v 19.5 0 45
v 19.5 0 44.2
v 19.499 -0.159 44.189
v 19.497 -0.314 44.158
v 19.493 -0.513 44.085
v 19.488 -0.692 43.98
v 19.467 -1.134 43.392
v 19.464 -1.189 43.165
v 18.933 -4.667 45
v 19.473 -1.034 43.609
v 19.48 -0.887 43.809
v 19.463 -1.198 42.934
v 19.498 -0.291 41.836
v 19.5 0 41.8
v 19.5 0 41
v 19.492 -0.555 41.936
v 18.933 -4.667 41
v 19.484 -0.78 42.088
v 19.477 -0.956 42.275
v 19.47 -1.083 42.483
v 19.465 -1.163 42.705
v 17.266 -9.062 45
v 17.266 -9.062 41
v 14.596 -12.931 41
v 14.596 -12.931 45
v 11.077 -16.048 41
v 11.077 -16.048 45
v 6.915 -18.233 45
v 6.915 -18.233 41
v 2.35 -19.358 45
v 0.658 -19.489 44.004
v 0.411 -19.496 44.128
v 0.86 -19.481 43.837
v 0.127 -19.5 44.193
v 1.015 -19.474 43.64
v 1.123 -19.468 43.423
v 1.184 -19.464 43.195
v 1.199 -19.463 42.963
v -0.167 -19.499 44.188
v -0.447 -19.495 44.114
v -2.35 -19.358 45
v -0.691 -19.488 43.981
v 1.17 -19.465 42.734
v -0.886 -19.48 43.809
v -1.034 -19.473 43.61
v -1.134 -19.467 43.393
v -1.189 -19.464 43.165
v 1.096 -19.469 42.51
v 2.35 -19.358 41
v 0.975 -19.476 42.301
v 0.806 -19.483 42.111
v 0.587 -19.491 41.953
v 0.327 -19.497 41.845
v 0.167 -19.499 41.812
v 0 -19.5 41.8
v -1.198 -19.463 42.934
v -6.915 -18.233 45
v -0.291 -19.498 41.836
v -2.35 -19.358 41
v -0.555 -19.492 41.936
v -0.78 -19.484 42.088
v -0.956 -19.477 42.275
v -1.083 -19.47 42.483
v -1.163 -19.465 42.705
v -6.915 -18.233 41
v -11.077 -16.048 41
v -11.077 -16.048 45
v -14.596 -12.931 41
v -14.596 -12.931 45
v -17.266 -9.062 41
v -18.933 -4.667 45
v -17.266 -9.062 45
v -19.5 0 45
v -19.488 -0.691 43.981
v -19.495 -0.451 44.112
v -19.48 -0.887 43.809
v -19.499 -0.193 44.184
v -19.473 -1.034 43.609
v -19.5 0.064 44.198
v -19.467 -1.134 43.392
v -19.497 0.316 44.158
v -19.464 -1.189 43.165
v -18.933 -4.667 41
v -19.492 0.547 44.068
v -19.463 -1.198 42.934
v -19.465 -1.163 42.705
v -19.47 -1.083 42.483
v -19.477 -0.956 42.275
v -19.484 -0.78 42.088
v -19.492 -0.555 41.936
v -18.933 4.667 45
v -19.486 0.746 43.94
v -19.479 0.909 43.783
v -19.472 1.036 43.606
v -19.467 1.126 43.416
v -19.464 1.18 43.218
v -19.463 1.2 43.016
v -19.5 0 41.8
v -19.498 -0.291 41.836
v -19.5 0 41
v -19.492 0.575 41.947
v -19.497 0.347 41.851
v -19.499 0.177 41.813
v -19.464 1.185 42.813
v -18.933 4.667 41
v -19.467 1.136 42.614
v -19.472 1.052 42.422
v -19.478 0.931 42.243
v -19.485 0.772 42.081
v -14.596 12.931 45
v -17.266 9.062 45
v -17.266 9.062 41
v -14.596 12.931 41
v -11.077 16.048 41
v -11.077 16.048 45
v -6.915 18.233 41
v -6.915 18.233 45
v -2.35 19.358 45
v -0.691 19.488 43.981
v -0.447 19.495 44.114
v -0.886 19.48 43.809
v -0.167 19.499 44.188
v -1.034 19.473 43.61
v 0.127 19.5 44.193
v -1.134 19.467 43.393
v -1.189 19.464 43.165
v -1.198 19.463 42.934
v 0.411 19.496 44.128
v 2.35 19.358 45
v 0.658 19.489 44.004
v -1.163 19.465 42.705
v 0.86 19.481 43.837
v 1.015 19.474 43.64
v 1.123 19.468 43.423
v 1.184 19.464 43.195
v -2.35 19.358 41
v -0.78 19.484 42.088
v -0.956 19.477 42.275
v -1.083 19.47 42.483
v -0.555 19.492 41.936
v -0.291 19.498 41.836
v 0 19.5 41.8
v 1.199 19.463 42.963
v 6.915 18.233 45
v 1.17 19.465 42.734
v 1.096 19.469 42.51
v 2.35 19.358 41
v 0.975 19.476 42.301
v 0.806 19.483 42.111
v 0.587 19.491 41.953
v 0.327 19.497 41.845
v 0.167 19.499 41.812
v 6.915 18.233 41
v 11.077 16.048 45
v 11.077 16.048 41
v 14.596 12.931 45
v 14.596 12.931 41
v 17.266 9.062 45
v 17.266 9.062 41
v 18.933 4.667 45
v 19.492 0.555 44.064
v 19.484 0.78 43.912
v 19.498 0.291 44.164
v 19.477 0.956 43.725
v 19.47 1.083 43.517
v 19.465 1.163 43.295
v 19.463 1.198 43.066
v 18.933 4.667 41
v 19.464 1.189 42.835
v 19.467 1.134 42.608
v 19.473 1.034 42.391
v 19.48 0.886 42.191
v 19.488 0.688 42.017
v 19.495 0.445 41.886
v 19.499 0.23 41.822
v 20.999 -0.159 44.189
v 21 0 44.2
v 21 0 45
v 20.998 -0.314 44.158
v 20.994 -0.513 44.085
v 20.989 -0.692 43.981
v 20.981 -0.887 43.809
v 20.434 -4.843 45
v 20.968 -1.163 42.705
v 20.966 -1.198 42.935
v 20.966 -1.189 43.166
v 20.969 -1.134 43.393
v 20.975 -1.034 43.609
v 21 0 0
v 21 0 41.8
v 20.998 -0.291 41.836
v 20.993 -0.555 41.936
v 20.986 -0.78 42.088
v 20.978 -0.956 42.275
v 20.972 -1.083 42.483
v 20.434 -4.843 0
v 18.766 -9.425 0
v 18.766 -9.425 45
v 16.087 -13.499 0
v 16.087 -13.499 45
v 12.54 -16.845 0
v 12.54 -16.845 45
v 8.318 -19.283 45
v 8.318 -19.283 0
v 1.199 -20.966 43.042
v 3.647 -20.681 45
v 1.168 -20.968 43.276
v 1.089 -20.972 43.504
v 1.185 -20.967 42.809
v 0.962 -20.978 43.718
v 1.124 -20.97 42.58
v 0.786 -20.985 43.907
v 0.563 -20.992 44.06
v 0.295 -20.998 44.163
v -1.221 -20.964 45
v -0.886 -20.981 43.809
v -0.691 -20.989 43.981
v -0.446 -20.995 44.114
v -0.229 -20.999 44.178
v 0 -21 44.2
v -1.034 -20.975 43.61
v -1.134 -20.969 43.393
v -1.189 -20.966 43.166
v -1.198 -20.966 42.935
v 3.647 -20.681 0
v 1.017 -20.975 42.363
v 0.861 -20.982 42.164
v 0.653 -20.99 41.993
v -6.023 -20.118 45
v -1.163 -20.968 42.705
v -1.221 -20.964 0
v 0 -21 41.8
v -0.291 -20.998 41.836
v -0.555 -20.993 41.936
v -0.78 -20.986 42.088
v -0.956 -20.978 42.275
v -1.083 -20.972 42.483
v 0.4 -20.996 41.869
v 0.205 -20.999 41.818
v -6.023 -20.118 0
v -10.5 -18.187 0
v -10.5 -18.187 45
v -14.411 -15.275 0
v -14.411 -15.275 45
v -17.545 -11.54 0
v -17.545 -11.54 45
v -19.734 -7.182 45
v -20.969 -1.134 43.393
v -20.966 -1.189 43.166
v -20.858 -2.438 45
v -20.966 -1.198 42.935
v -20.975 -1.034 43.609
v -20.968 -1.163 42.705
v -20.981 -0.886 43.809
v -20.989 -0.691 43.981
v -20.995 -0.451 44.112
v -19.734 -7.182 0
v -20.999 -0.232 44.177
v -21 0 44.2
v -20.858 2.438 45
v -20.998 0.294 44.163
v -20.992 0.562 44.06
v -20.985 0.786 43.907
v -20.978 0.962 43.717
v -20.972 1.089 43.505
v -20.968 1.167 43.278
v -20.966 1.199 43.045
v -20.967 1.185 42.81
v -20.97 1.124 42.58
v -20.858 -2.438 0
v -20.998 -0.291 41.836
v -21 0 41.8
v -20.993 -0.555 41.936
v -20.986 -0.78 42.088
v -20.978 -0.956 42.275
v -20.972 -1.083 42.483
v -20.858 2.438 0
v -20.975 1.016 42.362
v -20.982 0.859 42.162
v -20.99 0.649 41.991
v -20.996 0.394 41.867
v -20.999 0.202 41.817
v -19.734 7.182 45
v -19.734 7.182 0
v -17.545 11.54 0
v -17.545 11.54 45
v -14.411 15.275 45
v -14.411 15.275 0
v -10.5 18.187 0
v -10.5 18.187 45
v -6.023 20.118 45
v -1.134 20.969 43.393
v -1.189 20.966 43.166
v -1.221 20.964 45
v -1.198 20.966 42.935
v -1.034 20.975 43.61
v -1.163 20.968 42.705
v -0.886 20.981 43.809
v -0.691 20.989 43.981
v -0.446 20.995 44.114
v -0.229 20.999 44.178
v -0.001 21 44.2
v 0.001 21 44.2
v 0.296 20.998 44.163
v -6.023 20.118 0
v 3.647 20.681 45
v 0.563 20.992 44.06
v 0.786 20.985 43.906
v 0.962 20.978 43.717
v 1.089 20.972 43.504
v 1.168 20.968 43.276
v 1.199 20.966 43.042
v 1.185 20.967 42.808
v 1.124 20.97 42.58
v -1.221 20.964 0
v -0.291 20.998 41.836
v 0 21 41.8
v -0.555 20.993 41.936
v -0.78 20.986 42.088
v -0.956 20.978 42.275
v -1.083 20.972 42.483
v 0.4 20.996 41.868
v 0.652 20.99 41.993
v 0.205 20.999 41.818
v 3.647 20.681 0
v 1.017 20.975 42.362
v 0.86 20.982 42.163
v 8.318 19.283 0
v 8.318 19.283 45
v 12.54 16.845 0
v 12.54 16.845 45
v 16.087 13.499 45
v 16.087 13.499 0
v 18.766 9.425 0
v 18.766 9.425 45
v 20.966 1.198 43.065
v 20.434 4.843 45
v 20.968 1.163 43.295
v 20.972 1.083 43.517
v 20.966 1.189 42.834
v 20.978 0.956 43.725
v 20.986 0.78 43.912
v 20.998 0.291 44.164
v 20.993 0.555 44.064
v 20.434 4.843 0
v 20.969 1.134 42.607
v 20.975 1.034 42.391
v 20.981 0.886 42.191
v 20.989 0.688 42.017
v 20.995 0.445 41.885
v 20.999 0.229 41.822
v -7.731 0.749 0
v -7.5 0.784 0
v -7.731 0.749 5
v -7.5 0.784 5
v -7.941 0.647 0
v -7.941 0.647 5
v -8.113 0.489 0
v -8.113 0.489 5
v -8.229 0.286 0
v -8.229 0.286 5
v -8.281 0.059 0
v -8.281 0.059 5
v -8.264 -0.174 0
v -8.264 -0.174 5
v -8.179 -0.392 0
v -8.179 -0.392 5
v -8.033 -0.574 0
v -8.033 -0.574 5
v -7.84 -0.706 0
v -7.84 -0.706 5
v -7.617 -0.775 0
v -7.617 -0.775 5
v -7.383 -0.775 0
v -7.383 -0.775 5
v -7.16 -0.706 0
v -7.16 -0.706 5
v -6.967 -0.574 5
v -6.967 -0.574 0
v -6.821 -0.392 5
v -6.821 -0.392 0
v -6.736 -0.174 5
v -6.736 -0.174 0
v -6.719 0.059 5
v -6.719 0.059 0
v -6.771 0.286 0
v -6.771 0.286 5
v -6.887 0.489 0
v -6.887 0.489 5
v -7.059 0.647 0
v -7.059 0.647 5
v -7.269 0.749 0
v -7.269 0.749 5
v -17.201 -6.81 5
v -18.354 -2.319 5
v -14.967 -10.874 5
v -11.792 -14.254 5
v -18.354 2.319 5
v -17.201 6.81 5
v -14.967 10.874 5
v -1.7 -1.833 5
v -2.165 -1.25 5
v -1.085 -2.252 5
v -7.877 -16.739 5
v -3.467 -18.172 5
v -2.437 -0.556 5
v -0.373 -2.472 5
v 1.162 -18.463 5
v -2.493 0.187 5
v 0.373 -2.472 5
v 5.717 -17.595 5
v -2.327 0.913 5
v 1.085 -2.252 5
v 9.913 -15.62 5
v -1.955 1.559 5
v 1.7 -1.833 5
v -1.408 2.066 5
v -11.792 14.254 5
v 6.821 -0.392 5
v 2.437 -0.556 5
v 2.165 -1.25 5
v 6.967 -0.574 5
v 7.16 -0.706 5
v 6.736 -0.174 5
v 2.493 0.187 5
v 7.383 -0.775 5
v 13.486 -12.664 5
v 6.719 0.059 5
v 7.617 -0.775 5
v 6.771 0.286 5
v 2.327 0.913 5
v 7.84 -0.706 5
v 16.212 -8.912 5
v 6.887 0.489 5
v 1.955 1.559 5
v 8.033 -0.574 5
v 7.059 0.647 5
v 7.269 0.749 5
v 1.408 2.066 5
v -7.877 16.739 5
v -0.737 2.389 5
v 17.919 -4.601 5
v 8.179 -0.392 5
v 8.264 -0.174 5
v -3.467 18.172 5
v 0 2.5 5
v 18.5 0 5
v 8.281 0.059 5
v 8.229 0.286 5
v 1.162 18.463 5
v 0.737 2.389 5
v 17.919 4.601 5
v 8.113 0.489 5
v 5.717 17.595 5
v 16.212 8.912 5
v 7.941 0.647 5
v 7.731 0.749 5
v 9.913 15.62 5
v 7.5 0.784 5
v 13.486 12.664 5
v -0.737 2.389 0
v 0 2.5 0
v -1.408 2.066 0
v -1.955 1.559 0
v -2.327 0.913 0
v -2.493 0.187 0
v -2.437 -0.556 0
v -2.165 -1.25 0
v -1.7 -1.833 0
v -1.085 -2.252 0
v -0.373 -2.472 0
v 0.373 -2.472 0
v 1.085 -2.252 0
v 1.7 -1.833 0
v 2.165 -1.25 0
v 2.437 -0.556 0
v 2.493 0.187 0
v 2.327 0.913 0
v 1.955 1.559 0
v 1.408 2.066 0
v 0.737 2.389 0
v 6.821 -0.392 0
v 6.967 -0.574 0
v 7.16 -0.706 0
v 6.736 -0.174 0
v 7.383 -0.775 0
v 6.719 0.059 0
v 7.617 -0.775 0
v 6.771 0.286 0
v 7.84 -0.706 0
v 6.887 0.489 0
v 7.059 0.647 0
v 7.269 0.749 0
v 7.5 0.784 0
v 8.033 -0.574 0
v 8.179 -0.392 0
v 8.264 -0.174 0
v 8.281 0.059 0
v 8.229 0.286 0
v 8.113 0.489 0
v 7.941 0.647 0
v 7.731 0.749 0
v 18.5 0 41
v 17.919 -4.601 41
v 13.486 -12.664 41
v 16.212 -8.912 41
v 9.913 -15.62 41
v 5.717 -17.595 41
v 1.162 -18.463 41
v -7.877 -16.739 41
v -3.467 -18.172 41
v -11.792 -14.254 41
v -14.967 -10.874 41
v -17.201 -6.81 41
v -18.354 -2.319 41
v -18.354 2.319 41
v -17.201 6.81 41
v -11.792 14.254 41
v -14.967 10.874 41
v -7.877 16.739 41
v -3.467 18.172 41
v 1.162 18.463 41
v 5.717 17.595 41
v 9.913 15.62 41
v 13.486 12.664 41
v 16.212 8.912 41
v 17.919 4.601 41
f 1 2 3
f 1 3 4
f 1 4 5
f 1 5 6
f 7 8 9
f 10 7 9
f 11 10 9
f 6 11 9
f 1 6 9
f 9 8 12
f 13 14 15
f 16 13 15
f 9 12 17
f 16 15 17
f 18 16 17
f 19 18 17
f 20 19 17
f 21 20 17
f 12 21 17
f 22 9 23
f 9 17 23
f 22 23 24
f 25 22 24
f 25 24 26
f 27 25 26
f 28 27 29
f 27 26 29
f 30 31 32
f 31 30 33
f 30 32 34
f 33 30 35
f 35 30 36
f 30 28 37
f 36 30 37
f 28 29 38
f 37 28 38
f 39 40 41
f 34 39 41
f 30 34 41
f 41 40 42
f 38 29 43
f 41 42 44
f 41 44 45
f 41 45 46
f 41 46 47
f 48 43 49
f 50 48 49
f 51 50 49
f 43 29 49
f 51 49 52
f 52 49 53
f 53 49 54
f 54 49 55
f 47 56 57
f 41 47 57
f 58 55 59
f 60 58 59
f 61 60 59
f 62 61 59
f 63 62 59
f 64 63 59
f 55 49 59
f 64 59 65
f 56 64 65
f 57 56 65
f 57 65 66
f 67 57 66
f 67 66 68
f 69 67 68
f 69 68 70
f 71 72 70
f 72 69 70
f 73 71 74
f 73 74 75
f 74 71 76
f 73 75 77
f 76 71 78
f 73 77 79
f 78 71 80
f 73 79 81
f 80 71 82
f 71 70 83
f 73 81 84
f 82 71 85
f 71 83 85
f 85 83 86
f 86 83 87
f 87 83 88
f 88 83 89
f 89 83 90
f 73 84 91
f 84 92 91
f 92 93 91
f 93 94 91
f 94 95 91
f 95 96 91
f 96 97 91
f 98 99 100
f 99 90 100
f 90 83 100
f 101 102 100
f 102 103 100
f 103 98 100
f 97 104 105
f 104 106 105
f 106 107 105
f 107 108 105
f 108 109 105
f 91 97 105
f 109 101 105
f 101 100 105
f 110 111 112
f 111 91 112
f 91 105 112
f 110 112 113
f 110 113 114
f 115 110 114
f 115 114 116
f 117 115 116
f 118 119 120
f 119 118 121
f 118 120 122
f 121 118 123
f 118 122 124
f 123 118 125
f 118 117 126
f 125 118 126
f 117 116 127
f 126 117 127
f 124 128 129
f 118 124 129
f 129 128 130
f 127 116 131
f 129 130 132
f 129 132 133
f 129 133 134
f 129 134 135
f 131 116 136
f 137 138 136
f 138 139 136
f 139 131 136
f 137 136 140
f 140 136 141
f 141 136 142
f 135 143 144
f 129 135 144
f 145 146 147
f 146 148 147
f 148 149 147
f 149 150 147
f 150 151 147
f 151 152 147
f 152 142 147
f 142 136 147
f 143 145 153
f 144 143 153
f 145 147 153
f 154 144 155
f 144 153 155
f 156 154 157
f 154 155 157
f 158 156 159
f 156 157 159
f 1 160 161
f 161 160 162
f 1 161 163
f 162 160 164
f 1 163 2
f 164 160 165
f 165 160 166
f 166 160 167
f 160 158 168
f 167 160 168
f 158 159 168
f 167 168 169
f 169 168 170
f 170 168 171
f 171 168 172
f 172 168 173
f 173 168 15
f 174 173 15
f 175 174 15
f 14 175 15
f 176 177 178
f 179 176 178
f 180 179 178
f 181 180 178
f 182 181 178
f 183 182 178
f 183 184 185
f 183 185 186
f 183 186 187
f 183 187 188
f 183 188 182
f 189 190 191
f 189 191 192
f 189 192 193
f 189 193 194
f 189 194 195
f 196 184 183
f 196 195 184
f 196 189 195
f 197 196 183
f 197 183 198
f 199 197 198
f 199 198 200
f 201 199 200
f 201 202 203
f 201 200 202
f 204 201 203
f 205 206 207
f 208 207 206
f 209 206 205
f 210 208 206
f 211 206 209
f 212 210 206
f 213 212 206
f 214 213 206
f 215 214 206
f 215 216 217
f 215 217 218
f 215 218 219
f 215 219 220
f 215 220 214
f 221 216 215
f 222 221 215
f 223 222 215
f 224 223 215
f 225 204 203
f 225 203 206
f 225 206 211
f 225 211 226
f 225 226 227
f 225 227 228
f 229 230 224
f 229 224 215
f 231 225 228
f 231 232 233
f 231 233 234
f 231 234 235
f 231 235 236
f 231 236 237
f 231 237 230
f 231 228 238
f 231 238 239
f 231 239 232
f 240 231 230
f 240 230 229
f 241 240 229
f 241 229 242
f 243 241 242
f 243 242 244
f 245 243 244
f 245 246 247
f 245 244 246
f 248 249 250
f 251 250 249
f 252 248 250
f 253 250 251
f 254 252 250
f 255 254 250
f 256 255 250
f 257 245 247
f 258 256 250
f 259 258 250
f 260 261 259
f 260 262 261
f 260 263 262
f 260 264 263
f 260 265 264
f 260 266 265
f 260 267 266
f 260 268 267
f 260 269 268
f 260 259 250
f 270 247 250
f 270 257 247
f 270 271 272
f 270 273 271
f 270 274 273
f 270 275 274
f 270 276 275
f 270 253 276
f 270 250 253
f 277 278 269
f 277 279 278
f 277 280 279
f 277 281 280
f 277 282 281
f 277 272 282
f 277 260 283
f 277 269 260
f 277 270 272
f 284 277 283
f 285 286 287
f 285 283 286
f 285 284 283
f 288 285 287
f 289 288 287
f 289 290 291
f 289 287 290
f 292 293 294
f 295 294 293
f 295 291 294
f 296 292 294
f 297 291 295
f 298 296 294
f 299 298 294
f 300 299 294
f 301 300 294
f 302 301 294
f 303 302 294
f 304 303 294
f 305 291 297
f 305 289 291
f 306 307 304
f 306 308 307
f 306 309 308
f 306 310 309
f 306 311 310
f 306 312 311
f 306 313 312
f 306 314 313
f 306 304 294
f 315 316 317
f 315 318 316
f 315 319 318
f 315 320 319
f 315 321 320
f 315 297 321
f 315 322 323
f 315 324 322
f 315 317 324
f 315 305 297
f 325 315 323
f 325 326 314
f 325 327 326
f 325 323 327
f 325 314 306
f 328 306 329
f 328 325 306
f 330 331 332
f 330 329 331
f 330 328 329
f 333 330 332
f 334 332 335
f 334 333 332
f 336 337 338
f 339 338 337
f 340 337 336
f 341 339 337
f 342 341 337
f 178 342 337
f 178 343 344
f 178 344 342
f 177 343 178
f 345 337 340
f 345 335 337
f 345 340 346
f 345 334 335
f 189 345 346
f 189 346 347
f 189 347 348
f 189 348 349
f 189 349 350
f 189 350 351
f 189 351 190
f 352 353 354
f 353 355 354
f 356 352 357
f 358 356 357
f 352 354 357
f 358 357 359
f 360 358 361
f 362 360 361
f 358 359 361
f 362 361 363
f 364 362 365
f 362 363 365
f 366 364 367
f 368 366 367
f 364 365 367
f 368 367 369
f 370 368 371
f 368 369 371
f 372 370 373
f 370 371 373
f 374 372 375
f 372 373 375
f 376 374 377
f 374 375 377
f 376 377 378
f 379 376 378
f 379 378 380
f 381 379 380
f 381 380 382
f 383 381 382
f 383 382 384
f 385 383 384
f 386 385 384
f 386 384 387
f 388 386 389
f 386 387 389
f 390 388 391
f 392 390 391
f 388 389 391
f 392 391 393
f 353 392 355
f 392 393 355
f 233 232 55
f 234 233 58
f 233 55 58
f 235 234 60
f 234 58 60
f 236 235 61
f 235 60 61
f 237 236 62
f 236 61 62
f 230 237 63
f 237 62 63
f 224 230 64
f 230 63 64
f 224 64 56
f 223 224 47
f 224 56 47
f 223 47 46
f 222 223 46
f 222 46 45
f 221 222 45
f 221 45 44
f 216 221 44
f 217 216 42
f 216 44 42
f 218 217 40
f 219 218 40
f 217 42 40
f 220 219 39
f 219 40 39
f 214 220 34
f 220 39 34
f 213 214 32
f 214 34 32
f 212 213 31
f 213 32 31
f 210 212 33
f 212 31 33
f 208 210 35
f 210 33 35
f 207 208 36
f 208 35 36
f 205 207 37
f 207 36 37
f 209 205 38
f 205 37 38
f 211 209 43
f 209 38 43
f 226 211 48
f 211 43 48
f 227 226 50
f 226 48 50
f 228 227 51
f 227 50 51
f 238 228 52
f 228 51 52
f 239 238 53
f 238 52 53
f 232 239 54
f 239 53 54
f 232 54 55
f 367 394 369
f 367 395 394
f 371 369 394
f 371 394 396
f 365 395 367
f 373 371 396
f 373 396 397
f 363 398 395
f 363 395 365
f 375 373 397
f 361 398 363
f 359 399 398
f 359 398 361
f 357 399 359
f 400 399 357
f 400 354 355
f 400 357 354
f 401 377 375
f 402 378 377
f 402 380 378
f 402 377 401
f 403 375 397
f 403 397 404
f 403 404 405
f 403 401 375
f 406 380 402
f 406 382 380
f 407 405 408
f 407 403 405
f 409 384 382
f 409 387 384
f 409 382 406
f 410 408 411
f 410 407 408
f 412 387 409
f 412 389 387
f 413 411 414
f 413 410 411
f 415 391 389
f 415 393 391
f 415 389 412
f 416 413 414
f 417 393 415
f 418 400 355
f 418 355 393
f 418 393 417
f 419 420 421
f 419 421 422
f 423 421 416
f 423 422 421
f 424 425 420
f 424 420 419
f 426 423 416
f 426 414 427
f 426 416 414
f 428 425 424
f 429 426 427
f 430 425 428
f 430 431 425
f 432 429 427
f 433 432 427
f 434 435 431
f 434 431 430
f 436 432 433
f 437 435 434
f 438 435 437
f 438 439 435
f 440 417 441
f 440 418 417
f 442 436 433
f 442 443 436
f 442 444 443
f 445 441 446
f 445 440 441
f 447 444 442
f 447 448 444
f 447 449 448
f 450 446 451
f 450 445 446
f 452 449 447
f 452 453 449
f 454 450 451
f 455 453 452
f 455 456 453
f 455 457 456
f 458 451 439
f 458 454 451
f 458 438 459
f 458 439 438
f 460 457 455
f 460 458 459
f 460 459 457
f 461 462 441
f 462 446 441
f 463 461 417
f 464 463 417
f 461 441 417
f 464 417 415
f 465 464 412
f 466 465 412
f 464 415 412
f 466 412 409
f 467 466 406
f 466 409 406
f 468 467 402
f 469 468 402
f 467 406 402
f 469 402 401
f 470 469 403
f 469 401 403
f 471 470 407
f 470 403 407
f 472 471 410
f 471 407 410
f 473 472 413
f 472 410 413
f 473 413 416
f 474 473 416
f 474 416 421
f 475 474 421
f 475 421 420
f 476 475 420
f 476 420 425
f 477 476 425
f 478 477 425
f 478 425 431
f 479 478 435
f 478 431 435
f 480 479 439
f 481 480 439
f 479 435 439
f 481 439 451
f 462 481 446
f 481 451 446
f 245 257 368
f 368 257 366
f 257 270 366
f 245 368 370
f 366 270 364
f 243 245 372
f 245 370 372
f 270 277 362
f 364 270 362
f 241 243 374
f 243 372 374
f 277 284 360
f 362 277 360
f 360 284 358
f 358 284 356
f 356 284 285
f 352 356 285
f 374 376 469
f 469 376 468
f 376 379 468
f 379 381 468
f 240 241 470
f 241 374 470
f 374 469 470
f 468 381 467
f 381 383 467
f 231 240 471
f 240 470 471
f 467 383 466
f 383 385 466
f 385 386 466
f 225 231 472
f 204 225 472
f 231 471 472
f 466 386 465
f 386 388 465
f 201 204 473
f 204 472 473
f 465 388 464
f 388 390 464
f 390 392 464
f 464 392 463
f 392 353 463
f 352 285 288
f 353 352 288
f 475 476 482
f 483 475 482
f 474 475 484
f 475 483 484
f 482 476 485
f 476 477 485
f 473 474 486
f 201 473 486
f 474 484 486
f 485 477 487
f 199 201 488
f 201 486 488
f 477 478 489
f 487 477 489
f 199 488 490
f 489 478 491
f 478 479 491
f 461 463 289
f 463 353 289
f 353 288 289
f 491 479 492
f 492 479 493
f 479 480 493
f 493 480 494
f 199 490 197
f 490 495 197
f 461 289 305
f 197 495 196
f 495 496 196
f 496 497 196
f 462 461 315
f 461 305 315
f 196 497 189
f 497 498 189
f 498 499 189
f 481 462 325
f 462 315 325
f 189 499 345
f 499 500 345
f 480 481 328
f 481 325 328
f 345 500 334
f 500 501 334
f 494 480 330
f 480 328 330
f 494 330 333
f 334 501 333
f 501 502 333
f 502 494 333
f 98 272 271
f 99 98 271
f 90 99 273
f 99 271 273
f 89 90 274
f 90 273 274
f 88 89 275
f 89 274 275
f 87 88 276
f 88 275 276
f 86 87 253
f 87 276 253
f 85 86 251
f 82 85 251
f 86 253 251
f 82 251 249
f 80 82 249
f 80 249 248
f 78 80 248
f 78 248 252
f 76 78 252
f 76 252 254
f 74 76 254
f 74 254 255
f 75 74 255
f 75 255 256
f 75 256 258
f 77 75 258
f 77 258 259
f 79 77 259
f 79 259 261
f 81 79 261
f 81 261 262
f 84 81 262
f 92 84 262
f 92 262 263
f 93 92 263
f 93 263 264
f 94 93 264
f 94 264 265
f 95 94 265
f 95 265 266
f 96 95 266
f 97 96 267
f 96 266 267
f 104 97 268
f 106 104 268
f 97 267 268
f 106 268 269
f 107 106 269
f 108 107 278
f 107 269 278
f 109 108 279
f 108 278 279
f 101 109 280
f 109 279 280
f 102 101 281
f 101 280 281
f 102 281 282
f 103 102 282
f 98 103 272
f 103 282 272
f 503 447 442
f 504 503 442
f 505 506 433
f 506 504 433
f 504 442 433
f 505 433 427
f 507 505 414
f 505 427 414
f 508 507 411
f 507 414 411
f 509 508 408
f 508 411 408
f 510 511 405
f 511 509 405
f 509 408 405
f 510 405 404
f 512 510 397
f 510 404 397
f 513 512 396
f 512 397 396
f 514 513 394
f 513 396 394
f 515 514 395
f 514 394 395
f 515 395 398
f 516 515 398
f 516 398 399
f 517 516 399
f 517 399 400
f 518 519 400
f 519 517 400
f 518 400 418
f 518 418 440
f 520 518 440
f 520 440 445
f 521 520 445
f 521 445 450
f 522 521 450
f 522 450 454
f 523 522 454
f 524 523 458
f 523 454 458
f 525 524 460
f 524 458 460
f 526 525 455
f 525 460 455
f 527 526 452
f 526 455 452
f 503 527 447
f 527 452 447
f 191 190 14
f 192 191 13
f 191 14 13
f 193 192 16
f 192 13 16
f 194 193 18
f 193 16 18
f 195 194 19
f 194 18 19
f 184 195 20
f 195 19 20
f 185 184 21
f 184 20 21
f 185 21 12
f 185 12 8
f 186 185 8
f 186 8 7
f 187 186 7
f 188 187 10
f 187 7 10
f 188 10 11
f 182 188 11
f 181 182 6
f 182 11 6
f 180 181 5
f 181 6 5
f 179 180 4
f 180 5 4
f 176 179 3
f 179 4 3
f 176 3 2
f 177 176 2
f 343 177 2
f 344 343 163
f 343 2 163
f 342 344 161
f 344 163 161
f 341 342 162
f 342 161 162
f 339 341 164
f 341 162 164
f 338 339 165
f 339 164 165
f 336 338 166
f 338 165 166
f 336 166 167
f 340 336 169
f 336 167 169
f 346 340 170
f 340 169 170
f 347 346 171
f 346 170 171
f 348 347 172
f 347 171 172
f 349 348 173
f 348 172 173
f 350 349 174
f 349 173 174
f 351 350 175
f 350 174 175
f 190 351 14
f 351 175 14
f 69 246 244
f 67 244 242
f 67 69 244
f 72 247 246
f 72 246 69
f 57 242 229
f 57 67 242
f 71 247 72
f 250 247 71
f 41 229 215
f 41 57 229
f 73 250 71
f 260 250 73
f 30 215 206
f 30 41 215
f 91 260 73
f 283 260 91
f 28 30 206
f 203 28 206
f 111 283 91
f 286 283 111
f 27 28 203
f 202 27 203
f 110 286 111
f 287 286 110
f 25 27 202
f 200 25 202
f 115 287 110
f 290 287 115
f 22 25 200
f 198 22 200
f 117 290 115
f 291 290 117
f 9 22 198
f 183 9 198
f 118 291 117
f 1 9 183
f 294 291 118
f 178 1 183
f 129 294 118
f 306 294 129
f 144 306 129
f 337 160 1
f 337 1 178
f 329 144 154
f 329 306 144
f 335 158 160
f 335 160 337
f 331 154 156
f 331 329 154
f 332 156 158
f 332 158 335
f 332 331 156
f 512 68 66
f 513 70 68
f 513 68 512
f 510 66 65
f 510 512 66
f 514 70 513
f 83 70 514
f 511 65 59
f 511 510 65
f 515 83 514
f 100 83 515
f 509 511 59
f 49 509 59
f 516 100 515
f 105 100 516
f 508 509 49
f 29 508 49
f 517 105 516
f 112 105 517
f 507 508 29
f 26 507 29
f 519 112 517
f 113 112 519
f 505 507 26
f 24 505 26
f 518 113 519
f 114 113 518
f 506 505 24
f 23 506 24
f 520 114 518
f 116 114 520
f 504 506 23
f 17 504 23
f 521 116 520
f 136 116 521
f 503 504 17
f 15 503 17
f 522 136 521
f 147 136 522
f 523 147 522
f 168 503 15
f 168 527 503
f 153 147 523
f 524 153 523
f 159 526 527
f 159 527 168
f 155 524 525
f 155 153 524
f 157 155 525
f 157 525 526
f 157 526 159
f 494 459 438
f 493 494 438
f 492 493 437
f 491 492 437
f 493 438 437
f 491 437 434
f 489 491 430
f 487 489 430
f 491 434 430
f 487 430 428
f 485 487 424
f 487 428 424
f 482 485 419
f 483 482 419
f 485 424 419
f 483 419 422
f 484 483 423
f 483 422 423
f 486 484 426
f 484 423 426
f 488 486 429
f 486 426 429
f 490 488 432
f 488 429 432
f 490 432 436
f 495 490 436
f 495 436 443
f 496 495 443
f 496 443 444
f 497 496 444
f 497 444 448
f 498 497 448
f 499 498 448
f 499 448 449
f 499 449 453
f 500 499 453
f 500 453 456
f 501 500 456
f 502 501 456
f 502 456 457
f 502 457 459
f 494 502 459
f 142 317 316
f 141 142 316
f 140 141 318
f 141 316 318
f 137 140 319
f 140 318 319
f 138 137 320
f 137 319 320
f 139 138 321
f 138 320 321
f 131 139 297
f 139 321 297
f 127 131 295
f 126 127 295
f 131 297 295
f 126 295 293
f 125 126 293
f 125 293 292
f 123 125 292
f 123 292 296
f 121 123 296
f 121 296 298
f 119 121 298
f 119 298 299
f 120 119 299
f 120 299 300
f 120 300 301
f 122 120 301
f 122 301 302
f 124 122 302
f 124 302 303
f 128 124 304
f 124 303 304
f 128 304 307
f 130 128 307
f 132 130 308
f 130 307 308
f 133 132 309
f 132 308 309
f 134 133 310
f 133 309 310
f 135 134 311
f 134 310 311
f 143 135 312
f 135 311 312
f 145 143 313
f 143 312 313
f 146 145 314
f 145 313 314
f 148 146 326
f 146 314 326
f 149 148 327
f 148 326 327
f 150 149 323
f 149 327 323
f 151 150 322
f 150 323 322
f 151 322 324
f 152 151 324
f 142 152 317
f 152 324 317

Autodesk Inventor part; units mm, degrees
ref_plane "YZ Plane" through (0, 0, 0) normal (1, 0, 0) x (0, 1, 0)
ref_plane "XY Plane" through (0, 0, 0) normal (0, 0, 1) x (1, 0, 0)
sketch "Skizze1" plane through (0, 0, 0) normal (0, 0, 1) x (1, 0, 0)
  line L0 (-29.4, 0) -> (29.4, 0) projected
  line L1 (0, -29.4) -> (0, 29.4) projected
  circle A0 centre (0, 0) radius 21
  dimension "d0" = 42
extrude "Extrusion1" add sketch "Skizze1" along normal blind 5
sketch "Skizze2" plane through (0, 0, 5) normal (0, 0, 1) x (1, 0, 0)
  circle A0 centre (0, 0) radius 21 projected
  circle A1 centre (0, 0) radius 21
  circle A2 centre (0, 0) radius 19.5
  dimension "d3" = 39
extrude "Extrusion2" add sketch "Skizze2" along normal blind 40
sketch "Skizze3" plane through (0, 0, 0) normal (0, 0, -1) x (-1, 0, 0)
  line L0 (29.4, 0) -> (-29.4, 0) projected
  line L1 (0, -29.4) -> (0, 29.4) projected
  point P0 (-7.5, 0)
  point P1 (7.5, 0)
  dimension "d6" = 15
hole "Bohrung1" at (7.5, 0, 0) at (-7.5, 0, 0) direction (0, 0, 1) diameter 1.567 end through all thread size "M2x0.4" class "6H" standard "ISO Metric profile"
hole "Bohrung2" at (0, 0, 0) direction (0, 0, 1) diameter 5 end through all
ref_plane "Arbeitsebene1" through (0, -21, 0) normal (0, 1, 0) x (-1, 0, 0)
sketch "Skizze4" plane through (0, -21, 0) normal (0, 1, 0) x (-1, 0, 0)
  line L0 (29.4, 0) -> (-29.4, 0) projected
  line L1 (0, -9) -> (0, 54) projected
  line L2 (21, 45) -> (-21, 45) projected
  point P0 (0, 0)
  point P1 (0, 43)
  dimension "d23" = 2
hole "Bohrung3" at (0, -21, 43) direction (0, 1, 0) diameter 2.4 end through all
pattern_circular "Runde Anordnung1" count 4 over 360 about axis through (0, 0, -10) along (0, 0, 1) of "Bohrung3"
sketch "Skizze5" plane through (0, 0, 5) normal (0, 0, 1) x (1, 0, 0)
  circle A0 centre (0, 0) radius 19.5 projected
  circle A1 centre (0, 0) radius 18.5
  dimension "d34" = 37
extrude "Extrusion3" add sketch "Skizze5" along normal blind 36
properties part number "13_1087_060"
